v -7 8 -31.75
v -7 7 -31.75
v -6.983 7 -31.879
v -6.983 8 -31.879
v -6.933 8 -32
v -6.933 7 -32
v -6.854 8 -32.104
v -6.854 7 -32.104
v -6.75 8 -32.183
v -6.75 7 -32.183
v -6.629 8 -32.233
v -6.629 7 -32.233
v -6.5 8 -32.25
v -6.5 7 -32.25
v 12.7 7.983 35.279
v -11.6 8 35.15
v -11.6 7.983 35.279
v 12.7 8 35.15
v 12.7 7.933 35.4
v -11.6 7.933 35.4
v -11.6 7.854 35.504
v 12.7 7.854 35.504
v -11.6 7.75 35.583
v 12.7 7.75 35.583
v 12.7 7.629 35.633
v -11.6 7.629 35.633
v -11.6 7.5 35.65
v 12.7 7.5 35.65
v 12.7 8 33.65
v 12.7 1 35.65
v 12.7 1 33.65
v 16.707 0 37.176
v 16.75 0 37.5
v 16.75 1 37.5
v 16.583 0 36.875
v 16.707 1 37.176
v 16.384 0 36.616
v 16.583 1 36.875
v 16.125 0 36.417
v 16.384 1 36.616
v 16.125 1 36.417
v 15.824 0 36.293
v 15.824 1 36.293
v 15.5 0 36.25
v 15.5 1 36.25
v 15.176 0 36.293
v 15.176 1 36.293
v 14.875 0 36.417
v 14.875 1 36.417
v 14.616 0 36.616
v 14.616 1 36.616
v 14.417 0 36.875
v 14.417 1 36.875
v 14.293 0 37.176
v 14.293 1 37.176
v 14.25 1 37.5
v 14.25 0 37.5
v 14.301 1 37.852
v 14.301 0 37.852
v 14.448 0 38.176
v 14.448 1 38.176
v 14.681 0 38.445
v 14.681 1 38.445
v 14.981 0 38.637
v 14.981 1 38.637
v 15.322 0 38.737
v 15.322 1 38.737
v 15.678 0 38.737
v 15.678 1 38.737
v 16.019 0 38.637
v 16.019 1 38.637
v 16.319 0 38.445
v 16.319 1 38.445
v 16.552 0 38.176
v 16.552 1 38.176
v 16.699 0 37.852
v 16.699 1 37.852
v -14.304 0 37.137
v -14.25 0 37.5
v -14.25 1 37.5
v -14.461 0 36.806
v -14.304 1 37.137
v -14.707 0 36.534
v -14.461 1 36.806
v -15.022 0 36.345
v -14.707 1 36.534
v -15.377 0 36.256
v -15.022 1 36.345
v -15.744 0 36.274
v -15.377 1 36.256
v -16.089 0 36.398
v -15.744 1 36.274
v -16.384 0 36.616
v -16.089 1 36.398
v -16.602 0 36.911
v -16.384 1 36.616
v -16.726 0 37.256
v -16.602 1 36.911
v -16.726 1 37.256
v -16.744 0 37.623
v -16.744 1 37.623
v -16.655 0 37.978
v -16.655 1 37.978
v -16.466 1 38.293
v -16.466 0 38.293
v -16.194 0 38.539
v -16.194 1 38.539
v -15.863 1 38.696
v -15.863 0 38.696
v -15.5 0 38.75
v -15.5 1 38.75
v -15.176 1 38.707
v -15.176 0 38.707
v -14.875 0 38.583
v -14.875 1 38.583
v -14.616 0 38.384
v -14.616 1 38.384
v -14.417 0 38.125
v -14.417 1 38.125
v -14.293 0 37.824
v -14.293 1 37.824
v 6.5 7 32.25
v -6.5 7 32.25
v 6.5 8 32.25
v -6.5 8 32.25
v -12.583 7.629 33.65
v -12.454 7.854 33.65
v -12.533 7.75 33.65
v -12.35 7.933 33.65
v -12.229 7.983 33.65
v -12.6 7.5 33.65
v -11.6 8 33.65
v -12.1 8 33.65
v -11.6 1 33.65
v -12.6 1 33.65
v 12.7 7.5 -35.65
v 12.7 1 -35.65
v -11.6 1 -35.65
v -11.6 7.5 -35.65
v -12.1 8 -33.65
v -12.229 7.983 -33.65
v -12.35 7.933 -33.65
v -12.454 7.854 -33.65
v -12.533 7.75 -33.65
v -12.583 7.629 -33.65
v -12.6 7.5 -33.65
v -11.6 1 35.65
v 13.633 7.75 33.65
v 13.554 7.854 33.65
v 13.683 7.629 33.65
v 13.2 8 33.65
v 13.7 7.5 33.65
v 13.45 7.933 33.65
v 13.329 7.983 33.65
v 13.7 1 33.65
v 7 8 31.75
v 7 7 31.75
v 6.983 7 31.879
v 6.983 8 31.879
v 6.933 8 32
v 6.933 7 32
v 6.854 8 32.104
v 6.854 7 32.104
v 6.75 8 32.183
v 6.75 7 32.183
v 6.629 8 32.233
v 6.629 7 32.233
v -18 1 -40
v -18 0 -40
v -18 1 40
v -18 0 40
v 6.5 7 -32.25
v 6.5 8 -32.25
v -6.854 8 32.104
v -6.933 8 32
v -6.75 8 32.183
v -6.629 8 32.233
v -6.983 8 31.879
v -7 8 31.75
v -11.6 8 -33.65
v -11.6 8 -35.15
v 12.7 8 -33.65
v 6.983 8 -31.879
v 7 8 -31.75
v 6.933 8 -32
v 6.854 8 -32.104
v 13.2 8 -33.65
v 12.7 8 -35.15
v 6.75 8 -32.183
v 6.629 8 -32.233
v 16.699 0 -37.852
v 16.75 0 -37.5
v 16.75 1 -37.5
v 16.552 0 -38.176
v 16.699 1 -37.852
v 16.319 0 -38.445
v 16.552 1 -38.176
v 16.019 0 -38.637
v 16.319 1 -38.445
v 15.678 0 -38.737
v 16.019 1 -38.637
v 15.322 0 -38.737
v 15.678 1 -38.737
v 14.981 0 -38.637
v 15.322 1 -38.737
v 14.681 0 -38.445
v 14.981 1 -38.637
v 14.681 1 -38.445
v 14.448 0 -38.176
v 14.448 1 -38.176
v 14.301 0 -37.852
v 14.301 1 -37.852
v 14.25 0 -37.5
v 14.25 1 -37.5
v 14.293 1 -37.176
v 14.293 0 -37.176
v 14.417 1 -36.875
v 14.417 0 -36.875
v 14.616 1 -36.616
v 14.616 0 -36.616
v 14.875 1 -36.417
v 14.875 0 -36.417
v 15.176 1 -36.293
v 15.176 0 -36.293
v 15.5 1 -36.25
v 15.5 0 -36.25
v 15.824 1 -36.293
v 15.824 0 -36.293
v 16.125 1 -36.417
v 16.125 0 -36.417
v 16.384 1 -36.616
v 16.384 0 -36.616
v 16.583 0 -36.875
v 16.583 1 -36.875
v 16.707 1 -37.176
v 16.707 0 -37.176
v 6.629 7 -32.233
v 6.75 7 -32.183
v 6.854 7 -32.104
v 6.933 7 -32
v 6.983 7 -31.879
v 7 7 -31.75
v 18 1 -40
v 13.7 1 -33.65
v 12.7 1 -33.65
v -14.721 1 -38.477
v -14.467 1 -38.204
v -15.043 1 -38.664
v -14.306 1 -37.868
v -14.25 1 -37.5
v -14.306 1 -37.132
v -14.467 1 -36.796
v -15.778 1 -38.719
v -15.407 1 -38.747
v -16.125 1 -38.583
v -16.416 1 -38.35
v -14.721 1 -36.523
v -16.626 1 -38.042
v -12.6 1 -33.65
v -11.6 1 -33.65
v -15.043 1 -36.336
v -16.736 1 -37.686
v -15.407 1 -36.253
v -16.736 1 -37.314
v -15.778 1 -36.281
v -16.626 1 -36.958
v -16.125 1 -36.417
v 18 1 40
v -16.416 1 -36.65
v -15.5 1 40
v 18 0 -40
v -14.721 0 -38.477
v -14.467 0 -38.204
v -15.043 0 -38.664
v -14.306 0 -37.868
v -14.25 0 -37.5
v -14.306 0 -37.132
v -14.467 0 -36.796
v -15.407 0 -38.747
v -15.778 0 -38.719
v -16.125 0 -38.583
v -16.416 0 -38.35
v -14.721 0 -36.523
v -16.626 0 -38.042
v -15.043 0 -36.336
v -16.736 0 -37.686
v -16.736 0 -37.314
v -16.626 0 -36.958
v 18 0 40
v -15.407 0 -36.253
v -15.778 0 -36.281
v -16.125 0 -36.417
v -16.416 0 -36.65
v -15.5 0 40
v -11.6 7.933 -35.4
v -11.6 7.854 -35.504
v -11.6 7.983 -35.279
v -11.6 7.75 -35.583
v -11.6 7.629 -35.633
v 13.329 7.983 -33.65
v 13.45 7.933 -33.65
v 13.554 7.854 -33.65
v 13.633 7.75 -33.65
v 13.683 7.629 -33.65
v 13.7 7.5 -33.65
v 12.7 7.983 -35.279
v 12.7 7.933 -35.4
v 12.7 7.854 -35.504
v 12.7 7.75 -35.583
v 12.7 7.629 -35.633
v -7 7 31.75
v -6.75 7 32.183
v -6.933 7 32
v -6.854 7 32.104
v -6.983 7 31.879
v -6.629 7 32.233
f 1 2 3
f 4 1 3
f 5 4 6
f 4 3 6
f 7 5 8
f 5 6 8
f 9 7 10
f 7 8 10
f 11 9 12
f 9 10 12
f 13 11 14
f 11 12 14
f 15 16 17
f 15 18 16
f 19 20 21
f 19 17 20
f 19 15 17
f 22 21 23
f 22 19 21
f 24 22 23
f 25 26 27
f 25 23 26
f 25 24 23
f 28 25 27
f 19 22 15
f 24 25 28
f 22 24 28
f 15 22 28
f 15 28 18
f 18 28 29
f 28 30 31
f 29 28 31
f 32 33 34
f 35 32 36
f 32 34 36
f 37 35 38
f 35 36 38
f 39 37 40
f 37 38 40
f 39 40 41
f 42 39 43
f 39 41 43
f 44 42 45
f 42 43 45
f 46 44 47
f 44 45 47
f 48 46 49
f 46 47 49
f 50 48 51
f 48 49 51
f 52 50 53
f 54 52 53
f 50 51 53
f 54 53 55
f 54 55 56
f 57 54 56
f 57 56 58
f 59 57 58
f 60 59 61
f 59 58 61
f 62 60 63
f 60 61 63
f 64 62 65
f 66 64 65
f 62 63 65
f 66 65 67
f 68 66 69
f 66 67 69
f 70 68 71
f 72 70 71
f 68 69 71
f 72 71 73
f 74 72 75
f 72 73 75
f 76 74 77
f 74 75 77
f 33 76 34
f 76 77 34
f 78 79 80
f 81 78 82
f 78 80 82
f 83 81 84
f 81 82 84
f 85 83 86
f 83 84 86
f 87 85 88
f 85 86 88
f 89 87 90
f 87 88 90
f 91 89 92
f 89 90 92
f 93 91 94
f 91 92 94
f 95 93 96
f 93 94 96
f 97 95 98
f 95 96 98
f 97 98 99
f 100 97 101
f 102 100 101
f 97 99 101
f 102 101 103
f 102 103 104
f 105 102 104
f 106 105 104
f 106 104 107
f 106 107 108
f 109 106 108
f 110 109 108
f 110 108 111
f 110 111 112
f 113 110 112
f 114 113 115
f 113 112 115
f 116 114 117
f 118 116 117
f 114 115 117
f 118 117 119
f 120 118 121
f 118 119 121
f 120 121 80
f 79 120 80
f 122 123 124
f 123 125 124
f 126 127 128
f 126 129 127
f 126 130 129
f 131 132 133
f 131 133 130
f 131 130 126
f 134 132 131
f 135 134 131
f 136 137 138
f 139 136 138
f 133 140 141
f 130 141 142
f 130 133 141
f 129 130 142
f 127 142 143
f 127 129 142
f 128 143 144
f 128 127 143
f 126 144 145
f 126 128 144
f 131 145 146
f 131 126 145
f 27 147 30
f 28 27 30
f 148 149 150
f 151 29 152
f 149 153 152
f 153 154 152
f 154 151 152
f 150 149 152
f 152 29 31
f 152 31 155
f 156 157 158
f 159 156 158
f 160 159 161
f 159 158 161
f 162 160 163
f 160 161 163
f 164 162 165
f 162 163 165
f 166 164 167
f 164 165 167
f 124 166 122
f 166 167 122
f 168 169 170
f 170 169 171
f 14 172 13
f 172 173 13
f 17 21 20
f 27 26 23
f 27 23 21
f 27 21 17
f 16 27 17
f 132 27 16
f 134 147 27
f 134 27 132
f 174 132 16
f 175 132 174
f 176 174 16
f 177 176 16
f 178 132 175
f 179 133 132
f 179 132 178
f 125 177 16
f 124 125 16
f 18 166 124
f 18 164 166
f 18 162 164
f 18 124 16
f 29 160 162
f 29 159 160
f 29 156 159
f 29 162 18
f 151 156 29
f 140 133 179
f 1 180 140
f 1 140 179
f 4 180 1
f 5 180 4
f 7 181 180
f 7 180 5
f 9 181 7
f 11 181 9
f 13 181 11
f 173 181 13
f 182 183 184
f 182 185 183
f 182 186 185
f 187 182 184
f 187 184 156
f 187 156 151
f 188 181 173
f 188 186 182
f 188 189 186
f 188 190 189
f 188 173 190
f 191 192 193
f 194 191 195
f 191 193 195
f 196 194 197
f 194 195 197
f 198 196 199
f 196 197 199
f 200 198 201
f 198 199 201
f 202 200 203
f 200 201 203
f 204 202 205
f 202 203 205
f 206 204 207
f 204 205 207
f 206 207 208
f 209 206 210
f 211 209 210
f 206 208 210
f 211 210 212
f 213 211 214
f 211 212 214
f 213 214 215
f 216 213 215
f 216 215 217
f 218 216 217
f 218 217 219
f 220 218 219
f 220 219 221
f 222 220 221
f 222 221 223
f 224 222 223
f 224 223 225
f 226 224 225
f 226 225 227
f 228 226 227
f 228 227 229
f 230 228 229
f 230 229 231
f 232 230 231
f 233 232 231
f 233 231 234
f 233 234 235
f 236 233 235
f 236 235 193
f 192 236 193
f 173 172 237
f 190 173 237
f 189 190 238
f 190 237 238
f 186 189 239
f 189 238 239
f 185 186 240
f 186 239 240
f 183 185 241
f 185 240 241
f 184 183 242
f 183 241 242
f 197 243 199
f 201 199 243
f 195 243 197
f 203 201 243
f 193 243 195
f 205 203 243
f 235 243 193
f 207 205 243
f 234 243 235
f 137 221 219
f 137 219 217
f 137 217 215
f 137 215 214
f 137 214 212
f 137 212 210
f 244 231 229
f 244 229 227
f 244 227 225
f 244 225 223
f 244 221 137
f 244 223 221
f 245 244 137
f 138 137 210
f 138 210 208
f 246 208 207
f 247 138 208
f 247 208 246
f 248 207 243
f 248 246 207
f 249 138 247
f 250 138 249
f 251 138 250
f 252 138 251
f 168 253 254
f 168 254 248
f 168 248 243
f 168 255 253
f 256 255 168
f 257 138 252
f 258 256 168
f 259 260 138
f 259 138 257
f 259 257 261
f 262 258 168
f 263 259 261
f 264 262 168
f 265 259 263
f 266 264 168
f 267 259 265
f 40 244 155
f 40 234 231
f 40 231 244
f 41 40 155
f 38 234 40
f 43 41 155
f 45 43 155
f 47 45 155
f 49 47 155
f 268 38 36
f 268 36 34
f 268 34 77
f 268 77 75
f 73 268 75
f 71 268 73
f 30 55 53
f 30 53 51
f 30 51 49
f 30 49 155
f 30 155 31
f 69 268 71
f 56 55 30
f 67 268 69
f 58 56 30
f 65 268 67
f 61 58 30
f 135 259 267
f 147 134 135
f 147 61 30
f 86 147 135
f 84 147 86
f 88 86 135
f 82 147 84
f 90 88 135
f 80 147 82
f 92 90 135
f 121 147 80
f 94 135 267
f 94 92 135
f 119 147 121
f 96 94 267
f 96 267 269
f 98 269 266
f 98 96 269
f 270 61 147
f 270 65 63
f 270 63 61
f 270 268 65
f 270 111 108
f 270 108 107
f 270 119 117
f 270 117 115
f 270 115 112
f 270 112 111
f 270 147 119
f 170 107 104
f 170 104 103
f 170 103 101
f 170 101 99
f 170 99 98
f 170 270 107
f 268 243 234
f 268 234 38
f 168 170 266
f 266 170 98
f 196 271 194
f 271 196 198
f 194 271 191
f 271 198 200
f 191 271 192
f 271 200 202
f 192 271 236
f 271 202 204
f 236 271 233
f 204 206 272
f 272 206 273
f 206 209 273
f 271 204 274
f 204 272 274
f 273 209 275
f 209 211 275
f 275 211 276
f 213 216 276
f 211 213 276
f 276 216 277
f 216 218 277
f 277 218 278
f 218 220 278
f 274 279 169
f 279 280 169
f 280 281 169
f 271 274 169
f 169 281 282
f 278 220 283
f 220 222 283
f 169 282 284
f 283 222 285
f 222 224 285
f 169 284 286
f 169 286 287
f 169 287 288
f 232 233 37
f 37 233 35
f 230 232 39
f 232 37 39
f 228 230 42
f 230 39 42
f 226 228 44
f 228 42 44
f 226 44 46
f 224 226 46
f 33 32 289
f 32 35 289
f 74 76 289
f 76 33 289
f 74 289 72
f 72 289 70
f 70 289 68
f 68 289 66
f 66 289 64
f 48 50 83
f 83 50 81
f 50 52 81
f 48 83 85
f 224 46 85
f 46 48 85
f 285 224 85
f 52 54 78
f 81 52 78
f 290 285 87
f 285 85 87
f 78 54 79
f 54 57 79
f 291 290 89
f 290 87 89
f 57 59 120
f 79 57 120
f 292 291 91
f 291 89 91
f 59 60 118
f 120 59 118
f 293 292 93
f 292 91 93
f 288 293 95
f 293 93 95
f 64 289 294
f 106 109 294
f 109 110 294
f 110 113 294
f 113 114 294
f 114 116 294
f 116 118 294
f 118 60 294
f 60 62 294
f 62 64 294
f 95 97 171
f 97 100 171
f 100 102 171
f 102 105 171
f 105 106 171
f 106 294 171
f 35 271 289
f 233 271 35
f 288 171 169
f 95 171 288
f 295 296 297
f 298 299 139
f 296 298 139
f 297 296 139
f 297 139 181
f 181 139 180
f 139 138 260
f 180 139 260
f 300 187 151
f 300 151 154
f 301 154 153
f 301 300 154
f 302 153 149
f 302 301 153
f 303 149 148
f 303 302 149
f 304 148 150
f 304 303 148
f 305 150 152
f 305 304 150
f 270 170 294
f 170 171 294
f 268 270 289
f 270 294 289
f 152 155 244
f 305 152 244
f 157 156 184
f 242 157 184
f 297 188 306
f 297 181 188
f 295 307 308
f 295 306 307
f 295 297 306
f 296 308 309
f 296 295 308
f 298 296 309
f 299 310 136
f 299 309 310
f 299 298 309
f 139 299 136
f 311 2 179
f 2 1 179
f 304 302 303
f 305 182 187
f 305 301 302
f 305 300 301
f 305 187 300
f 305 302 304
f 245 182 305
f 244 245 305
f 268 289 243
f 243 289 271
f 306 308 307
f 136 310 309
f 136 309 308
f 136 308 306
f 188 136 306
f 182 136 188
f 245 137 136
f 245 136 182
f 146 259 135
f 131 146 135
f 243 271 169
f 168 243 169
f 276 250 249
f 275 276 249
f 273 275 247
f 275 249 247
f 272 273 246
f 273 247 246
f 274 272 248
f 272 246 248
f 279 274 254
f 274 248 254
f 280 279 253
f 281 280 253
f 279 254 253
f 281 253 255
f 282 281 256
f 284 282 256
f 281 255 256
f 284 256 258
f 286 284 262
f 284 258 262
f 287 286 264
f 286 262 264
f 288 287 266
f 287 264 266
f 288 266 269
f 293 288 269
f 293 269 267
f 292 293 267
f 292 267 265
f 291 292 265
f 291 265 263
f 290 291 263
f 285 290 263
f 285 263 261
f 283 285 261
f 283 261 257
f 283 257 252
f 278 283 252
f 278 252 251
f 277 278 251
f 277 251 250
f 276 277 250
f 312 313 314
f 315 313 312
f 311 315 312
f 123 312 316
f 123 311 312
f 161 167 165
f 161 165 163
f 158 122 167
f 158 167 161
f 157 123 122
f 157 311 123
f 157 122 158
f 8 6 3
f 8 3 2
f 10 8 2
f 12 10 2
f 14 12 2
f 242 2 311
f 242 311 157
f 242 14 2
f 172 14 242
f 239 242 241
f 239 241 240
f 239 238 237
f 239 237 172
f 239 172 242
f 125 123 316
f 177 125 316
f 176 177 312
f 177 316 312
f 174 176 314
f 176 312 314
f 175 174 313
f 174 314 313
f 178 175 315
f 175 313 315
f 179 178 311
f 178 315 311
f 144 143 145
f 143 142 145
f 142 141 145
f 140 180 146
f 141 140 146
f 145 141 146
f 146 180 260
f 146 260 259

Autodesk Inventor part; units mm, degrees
ref_plane "YZ Plane" through (0, 0, 0) normal (1, 0, 0) x (0, 1, 0)
ref_plane "XZ Plane" through (0, 0, 0) normal (0, 1, 0) x (-1, 0, 0)
ref_plane "XY Plane" through (0, 0, 0) normal (0, 0, 1) x (1, 0, 0)
sketch "Sketch1" plane through (0, 0, 0) normal (0, 1, 0) x (-1, 0, 0)
  line L0 (-18, 40) -> (-18, -40)
  line L1 (-18, -40) -> (18, -40)
  line L2 (18, -40) -> (18, 40)
  line L3 (18, 40) -> (-18, 40)
  line L4 (-18, 40) -> (18, -40) construction
  line L5 (-18, -40) -> (18, 40) construction
  line L6 (18, 40) -> (-0.55, 40)
  line L7 (18, 40) -> (15.5, 40)
  line L8 (15.5, 40) -> (15.5, 37.5)
  circle A0 centre (15.5, 37.5) radius 1.25
  line L9 (15.5, 37.5) -> (-15.5, 37.5)
  line L10 (-15.5, 37.5) -> (-15.5, -37.5)
  line L11 (-15.5, -37.5) -> (15.5, -37.5)
  circle A1 centre (-15.5, 37.5) radius 1.25
  circle A2 centre (-15.5, -37.5) radius 1.25
  circle A3 centre (15.5, -37.5) radius 1.25
  point P0 (0, 0)
  dimension "d0" = 80
  dimension "d1" = 36
  dimension "d2" = 18.55
  dimension "d25" = 2.5
  dimension "d26" = 2.5
  dimension "d27" = 2.5
  dimension "d28" = 31
  dimension "d29" = 75
  dimension "d30" = 31
  dimension "d31" = 2.5
  dimension "d32" = 2.5
  dimension "d33" = 2.5
extrude "Extrusion1" add sketch "Sketch1" along normal blind 1 contours A3 | A2 L11 L10 | L10 L11 A2 | A1 L10 L9 | L9 L10 A1 | A0 L9 L8 | L8 L9 A0 | L3 L2 L1 L0
sketch "Sketch2" plane through (0, 1, 0) normal (0, 1, 0) x (1, 0, 0)
  line L0 (18, -40) -> (18, 40) projected
  line L1 (18, 40) -> (-18, 40) projected
  line L2 (-18, 40) -> (-18, -40) projected
  line L3 (-18, -40) -> (18, -40) projected
  line L4 (-18, -40) -> (0.55, -40)
  line L5 (-18, -40) -> (18, -40) projected
  line L6 (-11.6, -35.65) -> (-11.6, -33.65)
  line L7 (-11.6, -33.65) -> (-12.6, -33.65)
  line L8 (12.7, -35.65) -> (12.7, -33.65)
  line L9 (12.7, -33.65) -> (13.7, -33.65)
  line L10 (12.7, 35.65) -> (12.7, 33.65)
  line L11 (12.7, 33.65) -> (13.7, 33.65)
  line L12 (-11.6, 35.65) -> (-11.6, 33.65)
  line L13 (-11.6, 33.65) -> (-12.6, 33.65)
  line L14 (-11.6, -35.65) -> (12.7, -35.65)
  line L15 (13.7, -33.65) -> (13.7, 33.65)
  line L16 (12.7, 35.65) -> (-11.6, 35.65)
  line L17 (-12.6, 33.65) -> (-12.6, -33.65)
  point P0 (0, 0)
  dimension "d10" = 2
  dimension "d12" = 2
  dimension "d14" = 2
  dimension "d16" = 2
extrude "Extrusion2" add sketch "Sketch2" along normal blind 7 contours L6 L7 L17 L13 L12 L16 L10 L11 L15 L9 L8 L14
fillet "Fillet1" radius 0.5 4 edges at (-12.6, 8, 0) (0.55, 8, -35.65) (13.7, 8, 0) (0.55, 8, 35.65)
sketch "Sketch3" plane through (0, 8, 0) normal (0, 1, 0) x (1, 0, 0)
  line L0 (7, -32.25) -> (7, 32.25)
  line L1 (7, 32.25) -> (-7, 32.25)
  line L2 (-7, 32.25) -> (-7, -32.25)
  line L3 (-7, -32.25) -> (7, -32.25)
  line L4 (7, -32.25) -> (-7, 32.25) construction
  line L5 (7, 32.25) -> (-7, -32.25) construction
  point P0 (0, 0)
  dimension "d20" = 64.5
  dimension "d21" = 14
extrude "Extrusion3" cut sketch "Sketch3" against normal blind 1
fillet "Fillet2" radius 0.5 4 edges at (7, 7.5, -32.25) (7, 7.5, 32.25) (-7, 7.5, 32.25) (-7, 7.5, -32.25)
sketch "Sketch4" plane through (0, 1, 0) normal (0, 1, 0) x (1, 0, 0)
  line L0 (-18, 40) -> (-18, -40)
  line L1 (-18, -40) -> (18, -40)
  line L2 (18, -40) -> (18, 40)
  line L3 (18, 40) -> (-18, 40)
  line L4 (-18, 40) -> (18, -40) construction
  line L5 (-18, -40) -> (18, 40) construction
  line L6 (18, 40) -> (-0.55, 40)
  line L7 (18, 40) -> (15.5, 40)
  line L8 (15.5, 40) -> (15.5, 37.5)
  circle A0 centre (15.5, 37.5) radius 1.25
  line L9 (15.5, 37.5) -> (-15.5, 37.5)
  line L10 (-15.5, 37.5) -> (-15.5, -37.5)
  line L11 (-15.5, -37.5) -> (15.5, -37.5)
  circle A1 centre (-15.5, 37.5) radius 1.25
  circle A2 centre (-15.5, -37.5) radius 1.25
  circle A3 centre (15.5, -37.5) radius 1.25
  point P0 (0, 0)
  point P1 (0, 0)
  dimension "d34" = 80
  dimension "d35" = 36
  dimension "d36" = 18.55
  dimension "d37" = 2.5
  dimension "d38" = 2.5
  dimension "d39" = 2.5
  dimension "d40" = 31
  dimension "d41" = 75
  dimension "d42" = 31
  dimension "d43" = 2.5
  dimension "d44" = 2.5
  dimension "d45" = 2.5
extrude "Extrusion4" cut sketch "Sketch4" against normal blind 1 contours A3 | A2 L11 L10 | L10 L11 A2 | A1 L10 L9 | L9 L10 A1 | A0 L9 L8 | L8 L9 A0
properties part number "lcd05-16x2"
